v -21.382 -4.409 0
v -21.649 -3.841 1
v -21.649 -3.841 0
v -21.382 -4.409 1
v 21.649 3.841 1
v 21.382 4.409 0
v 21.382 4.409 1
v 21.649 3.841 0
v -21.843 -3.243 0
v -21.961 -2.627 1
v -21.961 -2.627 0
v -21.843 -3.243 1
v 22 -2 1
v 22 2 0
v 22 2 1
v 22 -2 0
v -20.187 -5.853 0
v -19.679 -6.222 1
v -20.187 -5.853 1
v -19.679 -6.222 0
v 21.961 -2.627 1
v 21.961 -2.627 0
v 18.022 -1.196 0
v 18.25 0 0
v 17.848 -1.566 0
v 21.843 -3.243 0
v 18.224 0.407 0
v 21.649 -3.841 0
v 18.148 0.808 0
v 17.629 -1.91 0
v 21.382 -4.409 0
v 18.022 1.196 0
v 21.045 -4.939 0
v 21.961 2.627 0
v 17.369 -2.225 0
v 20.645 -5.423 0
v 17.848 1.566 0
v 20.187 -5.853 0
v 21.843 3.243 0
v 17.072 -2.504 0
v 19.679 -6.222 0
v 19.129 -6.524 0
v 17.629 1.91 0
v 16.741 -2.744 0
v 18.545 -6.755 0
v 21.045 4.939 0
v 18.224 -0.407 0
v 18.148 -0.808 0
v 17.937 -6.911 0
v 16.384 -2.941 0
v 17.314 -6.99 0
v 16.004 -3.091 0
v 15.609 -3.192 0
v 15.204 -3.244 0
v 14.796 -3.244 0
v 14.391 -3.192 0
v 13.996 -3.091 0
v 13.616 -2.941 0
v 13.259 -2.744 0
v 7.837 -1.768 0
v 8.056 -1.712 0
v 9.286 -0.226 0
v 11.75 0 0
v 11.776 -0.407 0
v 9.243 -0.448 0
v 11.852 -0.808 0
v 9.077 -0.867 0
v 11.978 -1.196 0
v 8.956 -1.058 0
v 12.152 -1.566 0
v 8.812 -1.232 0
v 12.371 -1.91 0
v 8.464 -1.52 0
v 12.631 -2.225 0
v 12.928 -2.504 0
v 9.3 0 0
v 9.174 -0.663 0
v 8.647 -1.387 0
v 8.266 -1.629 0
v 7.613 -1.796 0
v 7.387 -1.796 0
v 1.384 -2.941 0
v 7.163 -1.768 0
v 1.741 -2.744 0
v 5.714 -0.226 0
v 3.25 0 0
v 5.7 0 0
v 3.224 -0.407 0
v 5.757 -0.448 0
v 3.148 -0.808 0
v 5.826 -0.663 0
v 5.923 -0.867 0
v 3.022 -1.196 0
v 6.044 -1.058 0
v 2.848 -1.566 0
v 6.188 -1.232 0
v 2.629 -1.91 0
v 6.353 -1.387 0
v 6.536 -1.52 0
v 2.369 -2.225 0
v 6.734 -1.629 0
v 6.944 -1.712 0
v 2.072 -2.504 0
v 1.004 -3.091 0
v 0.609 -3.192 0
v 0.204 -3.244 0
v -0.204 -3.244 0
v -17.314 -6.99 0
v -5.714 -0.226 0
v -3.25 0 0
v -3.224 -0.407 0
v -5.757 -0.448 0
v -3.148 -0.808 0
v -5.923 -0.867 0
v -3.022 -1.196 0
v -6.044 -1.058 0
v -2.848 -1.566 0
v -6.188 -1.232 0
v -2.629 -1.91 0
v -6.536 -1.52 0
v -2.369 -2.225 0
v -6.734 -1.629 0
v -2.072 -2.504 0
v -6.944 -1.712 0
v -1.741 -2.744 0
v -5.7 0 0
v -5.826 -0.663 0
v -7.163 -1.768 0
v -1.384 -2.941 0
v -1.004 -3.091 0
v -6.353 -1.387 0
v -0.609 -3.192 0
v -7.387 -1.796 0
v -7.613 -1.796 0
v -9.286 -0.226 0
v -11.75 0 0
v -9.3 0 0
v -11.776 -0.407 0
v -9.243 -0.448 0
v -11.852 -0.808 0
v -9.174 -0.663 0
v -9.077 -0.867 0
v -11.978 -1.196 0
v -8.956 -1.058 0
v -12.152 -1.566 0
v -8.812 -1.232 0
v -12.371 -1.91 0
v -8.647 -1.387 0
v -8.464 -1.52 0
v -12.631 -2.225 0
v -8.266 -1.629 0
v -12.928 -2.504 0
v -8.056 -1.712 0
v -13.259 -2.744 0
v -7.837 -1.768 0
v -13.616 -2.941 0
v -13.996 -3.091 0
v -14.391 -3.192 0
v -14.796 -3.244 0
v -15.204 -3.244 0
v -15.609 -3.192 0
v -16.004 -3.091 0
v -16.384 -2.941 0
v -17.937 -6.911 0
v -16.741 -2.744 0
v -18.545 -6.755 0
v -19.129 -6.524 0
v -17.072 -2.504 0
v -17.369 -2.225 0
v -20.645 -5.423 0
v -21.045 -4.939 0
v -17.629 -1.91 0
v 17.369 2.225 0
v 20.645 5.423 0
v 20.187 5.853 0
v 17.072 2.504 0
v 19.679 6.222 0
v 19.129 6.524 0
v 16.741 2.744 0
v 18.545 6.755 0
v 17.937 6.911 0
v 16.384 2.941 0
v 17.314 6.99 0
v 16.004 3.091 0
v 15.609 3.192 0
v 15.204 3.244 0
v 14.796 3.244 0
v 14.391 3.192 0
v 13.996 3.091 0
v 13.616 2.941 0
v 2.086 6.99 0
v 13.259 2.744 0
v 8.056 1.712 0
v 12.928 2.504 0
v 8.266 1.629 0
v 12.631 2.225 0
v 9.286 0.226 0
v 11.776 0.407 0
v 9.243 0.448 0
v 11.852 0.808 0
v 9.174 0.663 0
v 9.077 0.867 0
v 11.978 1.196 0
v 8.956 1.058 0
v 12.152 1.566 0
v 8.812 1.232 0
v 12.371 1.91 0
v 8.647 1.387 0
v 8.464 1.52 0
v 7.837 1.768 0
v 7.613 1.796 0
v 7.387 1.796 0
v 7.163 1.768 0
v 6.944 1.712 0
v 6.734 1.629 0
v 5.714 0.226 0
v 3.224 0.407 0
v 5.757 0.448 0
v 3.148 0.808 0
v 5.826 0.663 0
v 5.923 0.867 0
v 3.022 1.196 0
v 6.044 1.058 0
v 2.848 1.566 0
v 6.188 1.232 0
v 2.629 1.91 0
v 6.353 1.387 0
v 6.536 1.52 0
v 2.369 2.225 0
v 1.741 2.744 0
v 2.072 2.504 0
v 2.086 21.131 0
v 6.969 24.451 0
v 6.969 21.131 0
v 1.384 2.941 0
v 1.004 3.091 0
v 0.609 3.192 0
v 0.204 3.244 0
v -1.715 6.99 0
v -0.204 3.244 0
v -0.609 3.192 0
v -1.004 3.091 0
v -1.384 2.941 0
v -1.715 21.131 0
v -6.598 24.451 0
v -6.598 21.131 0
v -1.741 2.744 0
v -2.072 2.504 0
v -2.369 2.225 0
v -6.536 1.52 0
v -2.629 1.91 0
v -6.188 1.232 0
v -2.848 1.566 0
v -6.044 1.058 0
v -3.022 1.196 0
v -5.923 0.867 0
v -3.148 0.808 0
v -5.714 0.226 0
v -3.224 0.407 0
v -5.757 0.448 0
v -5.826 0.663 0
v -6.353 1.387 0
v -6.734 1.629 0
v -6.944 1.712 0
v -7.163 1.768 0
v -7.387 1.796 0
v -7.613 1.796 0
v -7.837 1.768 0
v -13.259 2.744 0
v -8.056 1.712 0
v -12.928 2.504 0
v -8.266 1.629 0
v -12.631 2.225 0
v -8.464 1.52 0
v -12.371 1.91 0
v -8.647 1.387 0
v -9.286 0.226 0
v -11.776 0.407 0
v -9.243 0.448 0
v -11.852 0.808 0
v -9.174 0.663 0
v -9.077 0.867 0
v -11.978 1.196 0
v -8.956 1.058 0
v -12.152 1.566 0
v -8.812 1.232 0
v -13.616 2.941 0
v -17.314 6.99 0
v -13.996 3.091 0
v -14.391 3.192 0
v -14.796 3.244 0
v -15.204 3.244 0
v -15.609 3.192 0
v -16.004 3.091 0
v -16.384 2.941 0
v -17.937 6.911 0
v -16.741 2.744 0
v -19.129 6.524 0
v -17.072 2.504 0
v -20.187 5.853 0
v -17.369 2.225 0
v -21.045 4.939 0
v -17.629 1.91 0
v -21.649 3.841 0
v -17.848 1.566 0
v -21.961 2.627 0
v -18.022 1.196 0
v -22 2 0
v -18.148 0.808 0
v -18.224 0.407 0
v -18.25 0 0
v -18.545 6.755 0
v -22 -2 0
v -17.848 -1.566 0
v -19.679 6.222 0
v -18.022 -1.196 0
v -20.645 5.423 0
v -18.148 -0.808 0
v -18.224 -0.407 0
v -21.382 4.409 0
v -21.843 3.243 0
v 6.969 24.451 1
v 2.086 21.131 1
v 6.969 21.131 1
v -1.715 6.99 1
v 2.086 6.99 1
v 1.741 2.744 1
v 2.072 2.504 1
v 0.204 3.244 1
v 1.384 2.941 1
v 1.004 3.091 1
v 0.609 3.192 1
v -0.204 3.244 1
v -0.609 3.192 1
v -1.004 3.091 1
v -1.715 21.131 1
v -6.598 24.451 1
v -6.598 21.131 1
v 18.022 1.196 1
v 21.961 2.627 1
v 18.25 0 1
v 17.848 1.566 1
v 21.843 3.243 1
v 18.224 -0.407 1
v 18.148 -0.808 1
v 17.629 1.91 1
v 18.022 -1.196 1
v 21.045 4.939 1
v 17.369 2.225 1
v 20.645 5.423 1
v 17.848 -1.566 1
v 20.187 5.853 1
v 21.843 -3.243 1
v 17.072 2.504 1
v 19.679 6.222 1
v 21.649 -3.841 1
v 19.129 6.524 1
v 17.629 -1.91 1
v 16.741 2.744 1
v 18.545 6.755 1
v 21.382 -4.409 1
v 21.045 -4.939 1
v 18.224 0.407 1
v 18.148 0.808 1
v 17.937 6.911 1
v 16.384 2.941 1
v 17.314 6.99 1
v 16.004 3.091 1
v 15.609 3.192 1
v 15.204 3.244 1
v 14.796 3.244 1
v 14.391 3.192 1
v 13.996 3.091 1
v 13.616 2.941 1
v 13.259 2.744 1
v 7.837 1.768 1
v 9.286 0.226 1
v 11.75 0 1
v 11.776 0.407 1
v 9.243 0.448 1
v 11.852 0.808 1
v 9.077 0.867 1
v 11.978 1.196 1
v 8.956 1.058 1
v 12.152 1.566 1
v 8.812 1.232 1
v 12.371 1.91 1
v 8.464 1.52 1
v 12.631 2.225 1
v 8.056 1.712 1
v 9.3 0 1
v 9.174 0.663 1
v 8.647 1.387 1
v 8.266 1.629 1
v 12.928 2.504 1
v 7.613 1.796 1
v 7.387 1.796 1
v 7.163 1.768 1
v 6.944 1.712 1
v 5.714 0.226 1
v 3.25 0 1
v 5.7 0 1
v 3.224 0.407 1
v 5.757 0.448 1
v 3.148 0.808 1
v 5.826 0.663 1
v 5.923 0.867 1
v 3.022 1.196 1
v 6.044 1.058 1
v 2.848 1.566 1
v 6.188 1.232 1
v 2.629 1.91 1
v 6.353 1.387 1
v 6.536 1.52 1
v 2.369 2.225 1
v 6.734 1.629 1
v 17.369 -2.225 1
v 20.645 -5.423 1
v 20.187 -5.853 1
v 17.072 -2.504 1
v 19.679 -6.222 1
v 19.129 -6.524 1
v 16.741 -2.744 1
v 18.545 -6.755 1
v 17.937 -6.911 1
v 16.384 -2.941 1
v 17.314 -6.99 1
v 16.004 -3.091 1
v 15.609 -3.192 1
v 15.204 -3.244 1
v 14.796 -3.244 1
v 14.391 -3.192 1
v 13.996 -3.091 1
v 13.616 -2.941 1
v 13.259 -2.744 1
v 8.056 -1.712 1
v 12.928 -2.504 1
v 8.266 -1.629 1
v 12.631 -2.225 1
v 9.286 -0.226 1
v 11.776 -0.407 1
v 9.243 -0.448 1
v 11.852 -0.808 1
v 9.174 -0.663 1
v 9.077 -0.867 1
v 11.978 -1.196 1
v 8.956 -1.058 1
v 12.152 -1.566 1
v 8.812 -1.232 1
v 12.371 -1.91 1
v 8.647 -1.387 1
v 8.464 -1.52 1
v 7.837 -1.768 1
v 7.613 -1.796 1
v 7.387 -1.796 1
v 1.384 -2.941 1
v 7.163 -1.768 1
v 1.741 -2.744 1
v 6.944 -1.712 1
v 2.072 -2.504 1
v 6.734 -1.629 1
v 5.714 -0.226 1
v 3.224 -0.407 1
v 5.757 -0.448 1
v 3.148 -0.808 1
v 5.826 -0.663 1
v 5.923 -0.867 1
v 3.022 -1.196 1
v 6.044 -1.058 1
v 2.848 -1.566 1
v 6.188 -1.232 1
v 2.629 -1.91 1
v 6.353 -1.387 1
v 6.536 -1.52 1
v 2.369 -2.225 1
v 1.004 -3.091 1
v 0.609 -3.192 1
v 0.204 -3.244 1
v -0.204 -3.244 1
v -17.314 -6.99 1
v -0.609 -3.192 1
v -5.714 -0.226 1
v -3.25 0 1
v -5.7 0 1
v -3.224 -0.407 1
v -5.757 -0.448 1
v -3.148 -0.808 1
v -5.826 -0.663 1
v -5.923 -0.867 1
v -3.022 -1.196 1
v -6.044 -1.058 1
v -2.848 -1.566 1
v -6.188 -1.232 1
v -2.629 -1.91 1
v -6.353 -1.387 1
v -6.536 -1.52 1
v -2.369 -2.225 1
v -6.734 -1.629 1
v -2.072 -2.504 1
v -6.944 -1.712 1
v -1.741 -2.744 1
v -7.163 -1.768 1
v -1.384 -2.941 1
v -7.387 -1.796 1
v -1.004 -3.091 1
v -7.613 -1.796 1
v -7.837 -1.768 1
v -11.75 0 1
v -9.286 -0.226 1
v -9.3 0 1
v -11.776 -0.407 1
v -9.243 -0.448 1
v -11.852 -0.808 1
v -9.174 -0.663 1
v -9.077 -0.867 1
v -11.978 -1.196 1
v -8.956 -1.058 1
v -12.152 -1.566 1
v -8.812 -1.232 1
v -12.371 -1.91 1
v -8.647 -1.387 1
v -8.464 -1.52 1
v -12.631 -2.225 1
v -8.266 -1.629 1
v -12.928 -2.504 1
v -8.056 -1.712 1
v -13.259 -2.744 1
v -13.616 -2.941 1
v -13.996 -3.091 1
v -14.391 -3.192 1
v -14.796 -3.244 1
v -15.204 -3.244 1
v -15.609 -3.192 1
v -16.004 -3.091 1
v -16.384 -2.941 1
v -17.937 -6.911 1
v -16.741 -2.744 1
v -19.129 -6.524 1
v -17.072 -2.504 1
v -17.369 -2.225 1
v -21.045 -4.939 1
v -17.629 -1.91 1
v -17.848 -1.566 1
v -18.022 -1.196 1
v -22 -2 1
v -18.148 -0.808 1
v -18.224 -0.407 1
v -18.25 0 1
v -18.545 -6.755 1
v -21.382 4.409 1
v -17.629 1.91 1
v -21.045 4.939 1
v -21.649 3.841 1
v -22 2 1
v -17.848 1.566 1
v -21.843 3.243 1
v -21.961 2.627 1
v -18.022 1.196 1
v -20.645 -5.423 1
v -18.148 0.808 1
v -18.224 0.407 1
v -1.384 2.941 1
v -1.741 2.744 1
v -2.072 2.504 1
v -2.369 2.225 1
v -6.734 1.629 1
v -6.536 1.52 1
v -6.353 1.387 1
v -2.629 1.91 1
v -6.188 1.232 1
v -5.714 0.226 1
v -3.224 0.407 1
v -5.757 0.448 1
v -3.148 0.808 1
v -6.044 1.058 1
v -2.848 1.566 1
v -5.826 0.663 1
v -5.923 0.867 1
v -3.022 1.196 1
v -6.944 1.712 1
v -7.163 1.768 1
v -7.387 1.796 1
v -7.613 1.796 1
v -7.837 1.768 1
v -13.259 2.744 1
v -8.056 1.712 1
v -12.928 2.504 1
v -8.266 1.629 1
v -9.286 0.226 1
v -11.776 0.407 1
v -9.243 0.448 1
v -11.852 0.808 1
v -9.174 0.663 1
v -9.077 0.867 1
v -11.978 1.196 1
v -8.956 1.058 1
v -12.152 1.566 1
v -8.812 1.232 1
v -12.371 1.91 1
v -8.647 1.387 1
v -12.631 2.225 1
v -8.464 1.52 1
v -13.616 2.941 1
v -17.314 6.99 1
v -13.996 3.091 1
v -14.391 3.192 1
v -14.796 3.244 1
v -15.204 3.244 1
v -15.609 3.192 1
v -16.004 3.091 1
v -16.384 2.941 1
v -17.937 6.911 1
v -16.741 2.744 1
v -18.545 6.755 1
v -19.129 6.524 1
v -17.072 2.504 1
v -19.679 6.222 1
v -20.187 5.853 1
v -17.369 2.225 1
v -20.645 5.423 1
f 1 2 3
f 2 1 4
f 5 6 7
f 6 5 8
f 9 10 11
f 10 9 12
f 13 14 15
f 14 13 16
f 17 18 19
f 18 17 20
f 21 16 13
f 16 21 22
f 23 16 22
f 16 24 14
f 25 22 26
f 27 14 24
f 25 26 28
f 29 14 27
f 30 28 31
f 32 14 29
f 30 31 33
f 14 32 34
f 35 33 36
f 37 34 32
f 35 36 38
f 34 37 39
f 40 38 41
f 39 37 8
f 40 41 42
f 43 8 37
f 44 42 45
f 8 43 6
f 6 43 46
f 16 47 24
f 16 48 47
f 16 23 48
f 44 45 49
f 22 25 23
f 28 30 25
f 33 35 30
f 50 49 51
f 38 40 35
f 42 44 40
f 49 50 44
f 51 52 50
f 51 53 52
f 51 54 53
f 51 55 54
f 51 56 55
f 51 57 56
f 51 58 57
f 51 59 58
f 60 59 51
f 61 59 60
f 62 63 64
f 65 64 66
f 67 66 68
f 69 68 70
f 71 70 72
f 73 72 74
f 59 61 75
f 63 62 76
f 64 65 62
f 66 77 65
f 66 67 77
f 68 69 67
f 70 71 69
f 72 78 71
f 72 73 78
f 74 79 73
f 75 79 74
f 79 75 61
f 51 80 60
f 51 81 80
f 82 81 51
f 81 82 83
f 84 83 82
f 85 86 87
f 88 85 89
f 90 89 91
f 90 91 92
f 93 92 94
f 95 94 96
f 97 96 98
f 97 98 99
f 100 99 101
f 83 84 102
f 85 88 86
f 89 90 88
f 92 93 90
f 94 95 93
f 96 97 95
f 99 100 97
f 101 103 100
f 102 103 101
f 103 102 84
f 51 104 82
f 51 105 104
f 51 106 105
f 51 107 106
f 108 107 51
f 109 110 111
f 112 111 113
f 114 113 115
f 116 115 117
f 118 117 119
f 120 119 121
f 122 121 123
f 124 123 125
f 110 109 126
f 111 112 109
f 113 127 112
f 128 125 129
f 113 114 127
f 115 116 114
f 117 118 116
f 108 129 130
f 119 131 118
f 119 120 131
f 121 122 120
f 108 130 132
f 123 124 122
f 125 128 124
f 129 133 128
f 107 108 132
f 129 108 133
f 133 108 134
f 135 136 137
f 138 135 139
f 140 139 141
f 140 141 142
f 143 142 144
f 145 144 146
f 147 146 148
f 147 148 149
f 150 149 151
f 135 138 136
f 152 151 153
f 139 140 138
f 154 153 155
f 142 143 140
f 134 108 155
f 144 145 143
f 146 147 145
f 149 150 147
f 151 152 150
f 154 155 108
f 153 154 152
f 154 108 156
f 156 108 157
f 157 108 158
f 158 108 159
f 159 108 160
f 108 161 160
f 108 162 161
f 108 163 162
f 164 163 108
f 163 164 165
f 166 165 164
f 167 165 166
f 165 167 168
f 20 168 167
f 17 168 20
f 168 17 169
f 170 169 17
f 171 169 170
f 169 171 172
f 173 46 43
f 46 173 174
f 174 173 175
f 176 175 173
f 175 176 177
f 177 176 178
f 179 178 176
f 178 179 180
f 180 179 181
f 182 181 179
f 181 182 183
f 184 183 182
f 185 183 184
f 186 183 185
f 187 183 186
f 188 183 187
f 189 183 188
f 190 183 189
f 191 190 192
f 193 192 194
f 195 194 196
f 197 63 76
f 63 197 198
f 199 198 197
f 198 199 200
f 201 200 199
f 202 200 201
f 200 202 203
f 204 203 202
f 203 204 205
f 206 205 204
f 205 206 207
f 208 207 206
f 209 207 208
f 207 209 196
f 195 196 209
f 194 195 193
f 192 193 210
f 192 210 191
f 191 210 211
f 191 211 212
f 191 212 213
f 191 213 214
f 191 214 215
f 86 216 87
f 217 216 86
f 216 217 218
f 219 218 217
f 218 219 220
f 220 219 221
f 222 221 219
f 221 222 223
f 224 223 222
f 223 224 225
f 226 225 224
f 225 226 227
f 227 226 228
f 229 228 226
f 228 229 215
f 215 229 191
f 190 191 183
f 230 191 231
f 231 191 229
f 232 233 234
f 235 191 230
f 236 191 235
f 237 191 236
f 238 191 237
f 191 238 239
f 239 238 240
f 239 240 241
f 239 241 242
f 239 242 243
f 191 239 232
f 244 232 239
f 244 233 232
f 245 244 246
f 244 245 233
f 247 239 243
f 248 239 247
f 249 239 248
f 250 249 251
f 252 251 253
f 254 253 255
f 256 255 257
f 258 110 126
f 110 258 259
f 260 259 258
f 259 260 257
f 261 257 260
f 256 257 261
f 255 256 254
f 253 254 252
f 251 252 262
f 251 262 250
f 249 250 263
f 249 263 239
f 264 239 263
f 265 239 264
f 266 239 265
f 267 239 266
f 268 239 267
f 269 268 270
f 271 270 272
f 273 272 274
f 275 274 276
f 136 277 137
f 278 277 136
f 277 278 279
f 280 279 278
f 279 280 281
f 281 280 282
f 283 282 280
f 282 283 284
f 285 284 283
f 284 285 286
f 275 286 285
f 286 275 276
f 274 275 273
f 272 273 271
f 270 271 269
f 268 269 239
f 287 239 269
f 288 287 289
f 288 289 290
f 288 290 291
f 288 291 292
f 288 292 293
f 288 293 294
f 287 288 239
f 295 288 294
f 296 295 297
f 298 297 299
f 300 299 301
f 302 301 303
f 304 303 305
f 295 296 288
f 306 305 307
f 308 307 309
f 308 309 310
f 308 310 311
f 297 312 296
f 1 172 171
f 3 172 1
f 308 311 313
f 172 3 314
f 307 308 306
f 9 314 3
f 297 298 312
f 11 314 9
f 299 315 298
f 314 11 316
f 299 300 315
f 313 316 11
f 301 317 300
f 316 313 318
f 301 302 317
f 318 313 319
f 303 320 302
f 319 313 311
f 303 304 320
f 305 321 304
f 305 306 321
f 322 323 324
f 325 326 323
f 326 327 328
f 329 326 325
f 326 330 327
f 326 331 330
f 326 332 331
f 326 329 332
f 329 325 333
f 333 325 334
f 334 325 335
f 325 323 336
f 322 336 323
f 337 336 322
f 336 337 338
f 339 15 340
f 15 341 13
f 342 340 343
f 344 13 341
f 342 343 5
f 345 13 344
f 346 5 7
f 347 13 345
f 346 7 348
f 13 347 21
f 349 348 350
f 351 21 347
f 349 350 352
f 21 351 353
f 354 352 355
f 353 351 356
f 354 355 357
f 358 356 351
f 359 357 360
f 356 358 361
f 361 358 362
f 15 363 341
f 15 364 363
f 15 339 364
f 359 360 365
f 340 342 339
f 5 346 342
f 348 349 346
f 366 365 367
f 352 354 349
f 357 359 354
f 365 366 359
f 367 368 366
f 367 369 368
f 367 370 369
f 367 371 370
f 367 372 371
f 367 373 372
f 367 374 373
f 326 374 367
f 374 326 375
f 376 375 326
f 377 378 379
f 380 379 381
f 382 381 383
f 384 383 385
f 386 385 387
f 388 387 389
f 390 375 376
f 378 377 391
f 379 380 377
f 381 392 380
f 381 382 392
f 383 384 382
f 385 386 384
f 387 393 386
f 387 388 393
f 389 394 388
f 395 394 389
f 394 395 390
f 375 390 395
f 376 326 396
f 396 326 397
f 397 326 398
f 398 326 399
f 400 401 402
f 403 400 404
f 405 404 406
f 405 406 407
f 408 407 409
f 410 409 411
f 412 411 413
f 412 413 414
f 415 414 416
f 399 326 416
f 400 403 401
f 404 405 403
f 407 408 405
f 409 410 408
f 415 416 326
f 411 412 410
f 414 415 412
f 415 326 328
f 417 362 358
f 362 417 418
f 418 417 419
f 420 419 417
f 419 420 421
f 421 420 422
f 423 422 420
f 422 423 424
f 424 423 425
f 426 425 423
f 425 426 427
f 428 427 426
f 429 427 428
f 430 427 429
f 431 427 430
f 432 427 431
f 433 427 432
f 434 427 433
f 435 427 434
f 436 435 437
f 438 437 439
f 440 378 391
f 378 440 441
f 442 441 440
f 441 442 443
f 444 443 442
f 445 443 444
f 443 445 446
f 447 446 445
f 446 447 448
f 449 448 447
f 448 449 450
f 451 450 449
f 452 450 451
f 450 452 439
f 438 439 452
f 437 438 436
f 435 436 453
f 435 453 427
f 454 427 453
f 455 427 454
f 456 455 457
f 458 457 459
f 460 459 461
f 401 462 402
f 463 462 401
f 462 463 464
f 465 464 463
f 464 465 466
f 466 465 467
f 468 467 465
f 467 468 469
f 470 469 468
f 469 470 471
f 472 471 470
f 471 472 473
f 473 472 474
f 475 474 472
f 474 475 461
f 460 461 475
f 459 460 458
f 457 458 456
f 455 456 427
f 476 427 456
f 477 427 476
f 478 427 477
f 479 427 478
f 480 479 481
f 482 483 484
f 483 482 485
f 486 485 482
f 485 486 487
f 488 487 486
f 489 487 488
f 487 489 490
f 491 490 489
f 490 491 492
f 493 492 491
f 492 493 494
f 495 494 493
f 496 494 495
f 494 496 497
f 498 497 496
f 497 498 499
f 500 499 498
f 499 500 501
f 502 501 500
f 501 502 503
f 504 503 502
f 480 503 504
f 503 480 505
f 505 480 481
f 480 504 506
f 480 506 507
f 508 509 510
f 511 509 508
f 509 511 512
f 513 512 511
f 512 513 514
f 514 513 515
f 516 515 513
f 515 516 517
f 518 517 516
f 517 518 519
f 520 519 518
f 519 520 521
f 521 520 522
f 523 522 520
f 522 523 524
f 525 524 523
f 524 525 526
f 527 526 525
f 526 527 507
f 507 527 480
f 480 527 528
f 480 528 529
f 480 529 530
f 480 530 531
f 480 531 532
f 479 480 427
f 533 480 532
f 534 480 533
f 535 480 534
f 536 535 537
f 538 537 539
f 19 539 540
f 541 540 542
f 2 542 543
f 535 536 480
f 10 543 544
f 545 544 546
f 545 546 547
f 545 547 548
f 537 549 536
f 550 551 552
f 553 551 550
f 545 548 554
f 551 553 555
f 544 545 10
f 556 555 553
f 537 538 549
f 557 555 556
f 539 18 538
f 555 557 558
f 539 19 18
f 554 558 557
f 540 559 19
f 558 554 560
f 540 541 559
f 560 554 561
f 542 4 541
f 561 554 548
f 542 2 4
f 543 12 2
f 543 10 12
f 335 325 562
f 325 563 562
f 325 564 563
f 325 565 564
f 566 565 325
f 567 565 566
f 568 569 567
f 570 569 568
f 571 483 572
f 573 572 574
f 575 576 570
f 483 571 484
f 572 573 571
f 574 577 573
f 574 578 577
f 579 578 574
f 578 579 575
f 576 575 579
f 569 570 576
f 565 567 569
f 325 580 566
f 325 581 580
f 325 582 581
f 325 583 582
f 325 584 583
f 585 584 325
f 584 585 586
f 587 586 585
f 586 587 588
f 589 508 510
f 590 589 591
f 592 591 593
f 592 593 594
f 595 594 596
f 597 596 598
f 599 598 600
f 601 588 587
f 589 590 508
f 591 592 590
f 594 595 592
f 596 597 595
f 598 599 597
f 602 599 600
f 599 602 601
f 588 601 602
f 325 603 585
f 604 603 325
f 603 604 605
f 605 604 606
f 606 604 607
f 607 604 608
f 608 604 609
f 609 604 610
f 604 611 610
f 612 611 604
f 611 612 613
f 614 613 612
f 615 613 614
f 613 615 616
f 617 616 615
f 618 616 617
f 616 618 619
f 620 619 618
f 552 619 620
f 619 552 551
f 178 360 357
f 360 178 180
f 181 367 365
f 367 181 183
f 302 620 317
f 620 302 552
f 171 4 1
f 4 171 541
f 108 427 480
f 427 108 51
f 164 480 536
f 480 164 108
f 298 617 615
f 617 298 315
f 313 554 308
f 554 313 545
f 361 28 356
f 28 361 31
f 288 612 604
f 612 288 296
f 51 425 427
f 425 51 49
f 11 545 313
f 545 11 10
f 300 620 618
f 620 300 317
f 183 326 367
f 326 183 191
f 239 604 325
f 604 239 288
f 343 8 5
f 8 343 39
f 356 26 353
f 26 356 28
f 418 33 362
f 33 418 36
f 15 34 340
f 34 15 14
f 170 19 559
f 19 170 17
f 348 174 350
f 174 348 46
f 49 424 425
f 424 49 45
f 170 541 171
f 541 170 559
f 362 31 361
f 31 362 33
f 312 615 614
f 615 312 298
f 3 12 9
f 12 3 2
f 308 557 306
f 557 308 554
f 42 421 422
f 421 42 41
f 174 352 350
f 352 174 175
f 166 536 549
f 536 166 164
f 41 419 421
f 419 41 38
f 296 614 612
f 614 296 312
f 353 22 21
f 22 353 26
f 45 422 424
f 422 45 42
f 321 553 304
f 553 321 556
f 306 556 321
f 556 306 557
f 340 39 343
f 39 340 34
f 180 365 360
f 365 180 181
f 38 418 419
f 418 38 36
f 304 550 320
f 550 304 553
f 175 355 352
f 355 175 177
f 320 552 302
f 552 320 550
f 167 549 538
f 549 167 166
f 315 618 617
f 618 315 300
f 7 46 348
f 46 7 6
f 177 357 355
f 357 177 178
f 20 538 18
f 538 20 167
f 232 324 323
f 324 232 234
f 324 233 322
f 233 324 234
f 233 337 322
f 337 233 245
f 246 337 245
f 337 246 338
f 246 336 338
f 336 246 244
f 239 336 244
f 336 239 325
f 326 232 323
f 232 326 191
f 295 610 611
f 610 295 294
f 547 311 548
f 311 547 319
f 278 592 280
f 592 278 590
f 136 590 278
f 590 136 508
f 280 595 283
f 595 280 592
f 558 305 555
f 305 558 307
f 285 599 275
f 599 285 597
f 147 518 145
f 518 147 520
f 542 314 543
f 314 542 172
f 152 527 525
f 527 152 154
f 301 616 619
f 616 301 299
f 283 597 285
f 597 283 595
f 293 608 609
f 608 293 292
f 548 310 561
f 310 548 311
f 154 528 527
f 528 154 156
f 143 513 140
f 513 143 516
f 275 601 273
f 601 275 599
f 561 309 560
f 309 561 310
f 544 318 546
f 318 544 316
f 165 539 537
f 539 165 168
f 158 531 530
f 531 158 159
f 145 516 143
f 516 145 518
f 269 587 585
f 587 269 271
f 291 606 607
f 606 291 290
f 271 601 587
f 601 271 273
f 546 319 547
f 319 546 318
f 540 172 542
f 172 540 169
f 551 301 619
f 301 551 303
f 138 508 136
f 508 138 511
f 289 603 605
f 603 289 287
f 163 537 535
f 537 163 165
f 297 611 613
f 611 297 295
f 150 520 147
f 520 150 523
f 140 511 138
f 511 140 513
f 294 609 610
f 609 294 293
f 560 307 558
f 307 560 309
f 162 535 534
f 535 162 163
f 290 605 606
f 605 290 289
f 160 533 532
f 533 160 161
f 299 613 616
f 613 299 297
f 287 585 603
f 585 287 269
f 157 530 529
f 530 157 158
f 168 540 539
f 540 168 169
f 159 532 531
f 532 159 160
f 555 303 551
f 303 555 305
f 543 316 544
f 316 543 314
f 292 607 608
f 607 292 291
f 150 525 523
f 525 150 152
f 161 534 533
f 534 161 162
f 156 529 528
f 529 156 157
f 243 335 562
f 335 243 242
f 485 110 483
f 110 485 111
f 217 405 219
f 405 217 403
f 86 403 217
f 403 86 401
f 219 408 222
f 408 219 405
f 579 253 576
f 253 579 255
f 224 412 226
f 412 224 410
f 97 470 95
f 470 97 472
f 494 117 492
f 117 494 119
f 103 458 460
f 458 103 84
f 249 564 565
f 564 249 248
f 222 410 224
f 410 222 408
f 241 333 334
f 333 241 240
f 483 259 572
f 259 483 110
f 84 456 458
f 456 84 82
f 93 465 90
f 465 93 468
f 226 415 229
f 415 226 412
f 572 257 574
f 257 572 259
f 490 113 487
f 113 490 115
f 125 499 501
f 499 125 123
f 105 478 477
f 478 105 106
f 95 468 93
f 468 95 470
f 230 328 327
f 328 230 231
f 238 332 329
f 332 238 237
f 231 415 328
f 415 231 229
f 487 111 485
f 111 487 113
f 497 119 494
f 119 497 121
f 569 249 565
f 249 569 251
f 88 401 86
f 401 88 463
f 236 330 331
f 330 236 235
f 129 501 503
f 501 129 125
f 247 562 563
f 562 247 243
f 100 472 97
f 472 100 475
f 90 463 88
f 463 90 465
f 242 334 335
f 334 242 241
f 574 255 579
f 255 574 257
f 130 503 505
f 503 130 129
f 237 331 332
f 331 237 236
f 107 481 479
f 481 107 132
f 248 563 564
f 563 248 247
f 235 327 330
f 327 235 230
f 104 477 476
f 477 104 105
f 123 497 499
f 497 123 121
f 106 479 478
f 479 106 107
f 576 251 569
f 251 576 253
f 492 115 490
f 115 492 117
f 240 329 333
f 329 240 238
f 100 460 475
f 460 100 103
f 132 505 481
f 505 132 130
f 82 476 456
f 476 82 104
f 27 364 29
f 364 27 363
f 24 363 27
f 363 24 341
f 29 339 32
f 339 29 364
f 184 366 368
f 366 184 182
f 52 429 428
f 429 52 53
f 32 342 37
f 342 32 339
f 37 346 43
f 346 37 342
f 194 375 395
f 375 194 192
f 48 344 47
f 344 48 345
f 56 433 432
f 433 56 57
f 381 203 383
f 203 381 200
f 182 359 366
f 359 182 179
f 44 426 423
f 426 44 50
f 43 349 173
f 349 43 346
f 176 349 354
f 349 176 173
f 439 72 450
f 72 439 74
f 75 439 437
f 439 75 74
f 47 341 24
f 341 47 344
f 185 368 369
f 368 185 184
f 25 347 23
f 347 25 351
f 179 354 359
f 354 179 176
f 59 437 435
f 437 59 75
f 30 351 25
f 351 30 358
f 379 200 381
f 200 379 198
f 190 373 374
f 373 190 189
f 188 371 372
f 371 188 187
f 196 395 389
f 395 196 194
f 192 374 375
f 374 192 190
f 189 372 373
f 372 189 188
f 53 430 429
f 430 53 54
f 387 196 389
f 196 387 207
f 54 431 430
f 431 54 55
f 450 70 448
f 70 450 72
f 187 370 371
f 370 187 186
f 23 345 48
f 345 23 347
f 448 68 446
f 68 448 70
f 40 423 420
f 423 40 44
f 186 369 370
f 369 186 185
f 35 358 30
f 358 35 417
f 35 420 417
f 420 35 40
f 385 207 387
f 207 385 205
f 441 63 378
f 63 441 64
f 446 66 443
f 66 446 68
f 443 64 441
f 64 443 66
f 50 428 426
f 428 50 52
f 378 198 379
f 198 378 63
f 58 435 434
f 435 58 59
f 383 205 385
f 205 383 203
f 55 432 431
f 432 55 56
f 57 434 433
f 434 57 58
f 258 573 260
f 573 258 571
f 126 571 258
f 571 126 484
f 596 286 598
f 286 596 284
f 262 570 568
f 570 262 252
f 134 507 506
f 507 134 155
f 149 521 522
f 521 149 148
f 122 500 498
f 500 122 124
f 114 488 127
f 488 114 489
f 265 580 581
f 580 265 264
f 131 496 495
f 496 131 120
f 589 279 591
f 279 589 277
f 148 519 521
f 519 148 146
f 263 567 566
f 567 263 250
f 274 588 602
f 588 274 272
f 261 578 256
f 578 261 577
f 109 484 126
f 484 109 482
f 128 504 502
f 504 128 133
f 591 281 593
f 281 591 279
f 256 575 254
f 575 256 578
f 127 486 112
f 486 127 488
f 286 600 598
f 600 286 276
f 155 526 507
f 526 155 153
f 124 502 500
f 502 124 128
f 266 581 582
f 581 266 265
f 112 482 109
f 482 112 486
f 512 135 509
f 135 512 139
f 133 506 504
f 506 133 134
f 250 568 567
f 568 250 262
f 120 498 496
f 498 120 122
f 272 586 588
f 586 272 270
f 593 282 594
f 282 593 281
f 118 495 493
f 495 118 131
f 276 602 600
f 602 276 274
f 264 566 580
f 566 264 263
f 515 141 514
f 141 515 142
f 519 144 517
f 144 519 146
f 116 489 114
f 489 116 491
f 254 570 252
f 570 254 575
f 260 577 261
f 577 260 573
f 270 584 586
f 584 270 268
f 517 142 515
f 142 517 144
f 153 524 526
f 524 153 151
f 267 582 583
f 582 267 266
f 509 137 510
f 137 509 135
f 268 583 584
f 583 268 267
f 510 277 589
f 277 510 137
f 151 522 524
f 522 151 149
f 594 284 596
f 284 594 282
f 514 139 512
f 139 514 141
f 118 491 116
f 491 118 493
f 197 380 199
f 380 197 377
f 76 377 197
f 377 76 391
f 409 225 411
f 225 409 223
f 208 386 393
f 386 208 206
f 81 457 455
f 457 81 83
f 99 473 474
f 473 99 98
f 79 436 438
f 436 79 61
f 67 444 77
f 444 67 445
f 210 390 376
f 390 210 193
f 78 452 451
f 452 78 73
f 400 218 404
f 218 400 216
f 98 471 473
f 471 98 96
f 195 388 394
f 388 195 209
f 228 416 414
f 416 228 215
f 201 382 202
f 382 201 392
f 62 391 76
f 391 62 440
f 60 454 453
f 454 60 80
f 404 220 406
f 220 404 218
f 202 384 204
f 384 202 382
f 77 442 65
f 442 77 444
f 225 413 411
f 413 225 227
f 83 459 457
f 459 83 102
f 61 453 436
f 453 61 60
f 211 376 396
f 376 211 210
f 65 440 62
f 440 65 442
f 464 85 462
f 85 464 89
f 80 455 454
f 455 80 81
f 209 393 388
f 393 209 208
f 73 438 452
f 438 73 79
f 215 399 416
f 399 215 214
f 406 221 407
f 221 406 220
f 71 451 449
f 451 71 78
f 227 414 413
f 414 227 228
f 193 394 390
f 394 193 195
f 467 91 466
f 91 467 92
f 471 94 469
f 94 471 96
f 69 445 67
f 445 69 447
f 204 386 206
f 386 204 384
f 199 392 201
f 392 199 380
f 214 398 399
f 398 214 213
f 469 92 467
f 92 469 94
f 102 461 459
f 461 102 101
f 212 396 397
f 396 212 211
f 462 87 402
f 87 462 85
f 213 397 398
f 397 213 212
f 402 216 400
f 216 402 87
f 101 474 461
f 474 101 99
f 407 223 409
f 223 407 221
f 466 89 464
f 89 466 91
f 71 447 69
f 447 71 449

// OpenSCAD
$fn = 50;


difference() {
	union() {
		hull() {
			translate(v = [-17.0000000000, 2.0000000000, 0]) {
				cylinder(h = 1, r = 5);
			}
			translate(v = [17.0000000000, 2.0000000000, 0]) {
				cylinder(h = 1, r = 5);
			}
			translate(v = [-17.0000000000, -2.0000000000, 0]) {
				cylinder(h = 1, r = 5);
			}
			translate(v = [17.0000000000, -2.0000000000, 0]) {
				cylinder(h = 1, r = 5);
			}
		}
		translate(v = [0, 24, 0]) {
			linear_extrude(height = 1) {
				text(font = "DejaVu Sans Mono:style=Bold", halign = "center", size = 19.0000000000, text = "T", valign = "top");
			}
		}
	}
	union() {
		translate(v = [-15.0000000000, 0.0000000000, 0]) {
			translate(v = [0, 0, -100]) {
				cylinder(h = 200, r = 3.2500000000);
			}
		}
		translate(v = [0, 0, -100]) {
			cylinder(h = 200, r = 3.2500000000);
		}
		translate(v = [15.0000000000, 0.0000000000, 0]) {
			translate(v = [0, 0, -100]) {
				cylinder(h = 200, r = 3.2500000000);
			}
		}
		translate(v = [-15.0000000000, 0.0000000000, 0]) {
			translate(v = [0, 0, -100]) {
				cylinder(h = 200, r = 1.8000000000);
			}
		}
		translate(v = [-7.5000000000, 0.0000000000, 0]) {
			translate(v = [0, 0, -100]) {
				cylinder(h = 200, r = 1.8000000000);
			}
		}
		translate(v = [0, 0, -100]) {
			cylinder(h = 200, r = 1.8000000000);
		}
		translate(v = [7.5000000000, 0.0000000000, 0]) {
			translate(v = [0, 0, -100]) {
				cylinder(h = 200, r = 1.8000000000);
			}
		}
		translate(v = [15.0000000000, 0.0000000000, 0]) {
			translate(v = [0, 0, -100]) {
				cylinder(h = 200, r = 1.8000000000);
			}
		}
	}
}
